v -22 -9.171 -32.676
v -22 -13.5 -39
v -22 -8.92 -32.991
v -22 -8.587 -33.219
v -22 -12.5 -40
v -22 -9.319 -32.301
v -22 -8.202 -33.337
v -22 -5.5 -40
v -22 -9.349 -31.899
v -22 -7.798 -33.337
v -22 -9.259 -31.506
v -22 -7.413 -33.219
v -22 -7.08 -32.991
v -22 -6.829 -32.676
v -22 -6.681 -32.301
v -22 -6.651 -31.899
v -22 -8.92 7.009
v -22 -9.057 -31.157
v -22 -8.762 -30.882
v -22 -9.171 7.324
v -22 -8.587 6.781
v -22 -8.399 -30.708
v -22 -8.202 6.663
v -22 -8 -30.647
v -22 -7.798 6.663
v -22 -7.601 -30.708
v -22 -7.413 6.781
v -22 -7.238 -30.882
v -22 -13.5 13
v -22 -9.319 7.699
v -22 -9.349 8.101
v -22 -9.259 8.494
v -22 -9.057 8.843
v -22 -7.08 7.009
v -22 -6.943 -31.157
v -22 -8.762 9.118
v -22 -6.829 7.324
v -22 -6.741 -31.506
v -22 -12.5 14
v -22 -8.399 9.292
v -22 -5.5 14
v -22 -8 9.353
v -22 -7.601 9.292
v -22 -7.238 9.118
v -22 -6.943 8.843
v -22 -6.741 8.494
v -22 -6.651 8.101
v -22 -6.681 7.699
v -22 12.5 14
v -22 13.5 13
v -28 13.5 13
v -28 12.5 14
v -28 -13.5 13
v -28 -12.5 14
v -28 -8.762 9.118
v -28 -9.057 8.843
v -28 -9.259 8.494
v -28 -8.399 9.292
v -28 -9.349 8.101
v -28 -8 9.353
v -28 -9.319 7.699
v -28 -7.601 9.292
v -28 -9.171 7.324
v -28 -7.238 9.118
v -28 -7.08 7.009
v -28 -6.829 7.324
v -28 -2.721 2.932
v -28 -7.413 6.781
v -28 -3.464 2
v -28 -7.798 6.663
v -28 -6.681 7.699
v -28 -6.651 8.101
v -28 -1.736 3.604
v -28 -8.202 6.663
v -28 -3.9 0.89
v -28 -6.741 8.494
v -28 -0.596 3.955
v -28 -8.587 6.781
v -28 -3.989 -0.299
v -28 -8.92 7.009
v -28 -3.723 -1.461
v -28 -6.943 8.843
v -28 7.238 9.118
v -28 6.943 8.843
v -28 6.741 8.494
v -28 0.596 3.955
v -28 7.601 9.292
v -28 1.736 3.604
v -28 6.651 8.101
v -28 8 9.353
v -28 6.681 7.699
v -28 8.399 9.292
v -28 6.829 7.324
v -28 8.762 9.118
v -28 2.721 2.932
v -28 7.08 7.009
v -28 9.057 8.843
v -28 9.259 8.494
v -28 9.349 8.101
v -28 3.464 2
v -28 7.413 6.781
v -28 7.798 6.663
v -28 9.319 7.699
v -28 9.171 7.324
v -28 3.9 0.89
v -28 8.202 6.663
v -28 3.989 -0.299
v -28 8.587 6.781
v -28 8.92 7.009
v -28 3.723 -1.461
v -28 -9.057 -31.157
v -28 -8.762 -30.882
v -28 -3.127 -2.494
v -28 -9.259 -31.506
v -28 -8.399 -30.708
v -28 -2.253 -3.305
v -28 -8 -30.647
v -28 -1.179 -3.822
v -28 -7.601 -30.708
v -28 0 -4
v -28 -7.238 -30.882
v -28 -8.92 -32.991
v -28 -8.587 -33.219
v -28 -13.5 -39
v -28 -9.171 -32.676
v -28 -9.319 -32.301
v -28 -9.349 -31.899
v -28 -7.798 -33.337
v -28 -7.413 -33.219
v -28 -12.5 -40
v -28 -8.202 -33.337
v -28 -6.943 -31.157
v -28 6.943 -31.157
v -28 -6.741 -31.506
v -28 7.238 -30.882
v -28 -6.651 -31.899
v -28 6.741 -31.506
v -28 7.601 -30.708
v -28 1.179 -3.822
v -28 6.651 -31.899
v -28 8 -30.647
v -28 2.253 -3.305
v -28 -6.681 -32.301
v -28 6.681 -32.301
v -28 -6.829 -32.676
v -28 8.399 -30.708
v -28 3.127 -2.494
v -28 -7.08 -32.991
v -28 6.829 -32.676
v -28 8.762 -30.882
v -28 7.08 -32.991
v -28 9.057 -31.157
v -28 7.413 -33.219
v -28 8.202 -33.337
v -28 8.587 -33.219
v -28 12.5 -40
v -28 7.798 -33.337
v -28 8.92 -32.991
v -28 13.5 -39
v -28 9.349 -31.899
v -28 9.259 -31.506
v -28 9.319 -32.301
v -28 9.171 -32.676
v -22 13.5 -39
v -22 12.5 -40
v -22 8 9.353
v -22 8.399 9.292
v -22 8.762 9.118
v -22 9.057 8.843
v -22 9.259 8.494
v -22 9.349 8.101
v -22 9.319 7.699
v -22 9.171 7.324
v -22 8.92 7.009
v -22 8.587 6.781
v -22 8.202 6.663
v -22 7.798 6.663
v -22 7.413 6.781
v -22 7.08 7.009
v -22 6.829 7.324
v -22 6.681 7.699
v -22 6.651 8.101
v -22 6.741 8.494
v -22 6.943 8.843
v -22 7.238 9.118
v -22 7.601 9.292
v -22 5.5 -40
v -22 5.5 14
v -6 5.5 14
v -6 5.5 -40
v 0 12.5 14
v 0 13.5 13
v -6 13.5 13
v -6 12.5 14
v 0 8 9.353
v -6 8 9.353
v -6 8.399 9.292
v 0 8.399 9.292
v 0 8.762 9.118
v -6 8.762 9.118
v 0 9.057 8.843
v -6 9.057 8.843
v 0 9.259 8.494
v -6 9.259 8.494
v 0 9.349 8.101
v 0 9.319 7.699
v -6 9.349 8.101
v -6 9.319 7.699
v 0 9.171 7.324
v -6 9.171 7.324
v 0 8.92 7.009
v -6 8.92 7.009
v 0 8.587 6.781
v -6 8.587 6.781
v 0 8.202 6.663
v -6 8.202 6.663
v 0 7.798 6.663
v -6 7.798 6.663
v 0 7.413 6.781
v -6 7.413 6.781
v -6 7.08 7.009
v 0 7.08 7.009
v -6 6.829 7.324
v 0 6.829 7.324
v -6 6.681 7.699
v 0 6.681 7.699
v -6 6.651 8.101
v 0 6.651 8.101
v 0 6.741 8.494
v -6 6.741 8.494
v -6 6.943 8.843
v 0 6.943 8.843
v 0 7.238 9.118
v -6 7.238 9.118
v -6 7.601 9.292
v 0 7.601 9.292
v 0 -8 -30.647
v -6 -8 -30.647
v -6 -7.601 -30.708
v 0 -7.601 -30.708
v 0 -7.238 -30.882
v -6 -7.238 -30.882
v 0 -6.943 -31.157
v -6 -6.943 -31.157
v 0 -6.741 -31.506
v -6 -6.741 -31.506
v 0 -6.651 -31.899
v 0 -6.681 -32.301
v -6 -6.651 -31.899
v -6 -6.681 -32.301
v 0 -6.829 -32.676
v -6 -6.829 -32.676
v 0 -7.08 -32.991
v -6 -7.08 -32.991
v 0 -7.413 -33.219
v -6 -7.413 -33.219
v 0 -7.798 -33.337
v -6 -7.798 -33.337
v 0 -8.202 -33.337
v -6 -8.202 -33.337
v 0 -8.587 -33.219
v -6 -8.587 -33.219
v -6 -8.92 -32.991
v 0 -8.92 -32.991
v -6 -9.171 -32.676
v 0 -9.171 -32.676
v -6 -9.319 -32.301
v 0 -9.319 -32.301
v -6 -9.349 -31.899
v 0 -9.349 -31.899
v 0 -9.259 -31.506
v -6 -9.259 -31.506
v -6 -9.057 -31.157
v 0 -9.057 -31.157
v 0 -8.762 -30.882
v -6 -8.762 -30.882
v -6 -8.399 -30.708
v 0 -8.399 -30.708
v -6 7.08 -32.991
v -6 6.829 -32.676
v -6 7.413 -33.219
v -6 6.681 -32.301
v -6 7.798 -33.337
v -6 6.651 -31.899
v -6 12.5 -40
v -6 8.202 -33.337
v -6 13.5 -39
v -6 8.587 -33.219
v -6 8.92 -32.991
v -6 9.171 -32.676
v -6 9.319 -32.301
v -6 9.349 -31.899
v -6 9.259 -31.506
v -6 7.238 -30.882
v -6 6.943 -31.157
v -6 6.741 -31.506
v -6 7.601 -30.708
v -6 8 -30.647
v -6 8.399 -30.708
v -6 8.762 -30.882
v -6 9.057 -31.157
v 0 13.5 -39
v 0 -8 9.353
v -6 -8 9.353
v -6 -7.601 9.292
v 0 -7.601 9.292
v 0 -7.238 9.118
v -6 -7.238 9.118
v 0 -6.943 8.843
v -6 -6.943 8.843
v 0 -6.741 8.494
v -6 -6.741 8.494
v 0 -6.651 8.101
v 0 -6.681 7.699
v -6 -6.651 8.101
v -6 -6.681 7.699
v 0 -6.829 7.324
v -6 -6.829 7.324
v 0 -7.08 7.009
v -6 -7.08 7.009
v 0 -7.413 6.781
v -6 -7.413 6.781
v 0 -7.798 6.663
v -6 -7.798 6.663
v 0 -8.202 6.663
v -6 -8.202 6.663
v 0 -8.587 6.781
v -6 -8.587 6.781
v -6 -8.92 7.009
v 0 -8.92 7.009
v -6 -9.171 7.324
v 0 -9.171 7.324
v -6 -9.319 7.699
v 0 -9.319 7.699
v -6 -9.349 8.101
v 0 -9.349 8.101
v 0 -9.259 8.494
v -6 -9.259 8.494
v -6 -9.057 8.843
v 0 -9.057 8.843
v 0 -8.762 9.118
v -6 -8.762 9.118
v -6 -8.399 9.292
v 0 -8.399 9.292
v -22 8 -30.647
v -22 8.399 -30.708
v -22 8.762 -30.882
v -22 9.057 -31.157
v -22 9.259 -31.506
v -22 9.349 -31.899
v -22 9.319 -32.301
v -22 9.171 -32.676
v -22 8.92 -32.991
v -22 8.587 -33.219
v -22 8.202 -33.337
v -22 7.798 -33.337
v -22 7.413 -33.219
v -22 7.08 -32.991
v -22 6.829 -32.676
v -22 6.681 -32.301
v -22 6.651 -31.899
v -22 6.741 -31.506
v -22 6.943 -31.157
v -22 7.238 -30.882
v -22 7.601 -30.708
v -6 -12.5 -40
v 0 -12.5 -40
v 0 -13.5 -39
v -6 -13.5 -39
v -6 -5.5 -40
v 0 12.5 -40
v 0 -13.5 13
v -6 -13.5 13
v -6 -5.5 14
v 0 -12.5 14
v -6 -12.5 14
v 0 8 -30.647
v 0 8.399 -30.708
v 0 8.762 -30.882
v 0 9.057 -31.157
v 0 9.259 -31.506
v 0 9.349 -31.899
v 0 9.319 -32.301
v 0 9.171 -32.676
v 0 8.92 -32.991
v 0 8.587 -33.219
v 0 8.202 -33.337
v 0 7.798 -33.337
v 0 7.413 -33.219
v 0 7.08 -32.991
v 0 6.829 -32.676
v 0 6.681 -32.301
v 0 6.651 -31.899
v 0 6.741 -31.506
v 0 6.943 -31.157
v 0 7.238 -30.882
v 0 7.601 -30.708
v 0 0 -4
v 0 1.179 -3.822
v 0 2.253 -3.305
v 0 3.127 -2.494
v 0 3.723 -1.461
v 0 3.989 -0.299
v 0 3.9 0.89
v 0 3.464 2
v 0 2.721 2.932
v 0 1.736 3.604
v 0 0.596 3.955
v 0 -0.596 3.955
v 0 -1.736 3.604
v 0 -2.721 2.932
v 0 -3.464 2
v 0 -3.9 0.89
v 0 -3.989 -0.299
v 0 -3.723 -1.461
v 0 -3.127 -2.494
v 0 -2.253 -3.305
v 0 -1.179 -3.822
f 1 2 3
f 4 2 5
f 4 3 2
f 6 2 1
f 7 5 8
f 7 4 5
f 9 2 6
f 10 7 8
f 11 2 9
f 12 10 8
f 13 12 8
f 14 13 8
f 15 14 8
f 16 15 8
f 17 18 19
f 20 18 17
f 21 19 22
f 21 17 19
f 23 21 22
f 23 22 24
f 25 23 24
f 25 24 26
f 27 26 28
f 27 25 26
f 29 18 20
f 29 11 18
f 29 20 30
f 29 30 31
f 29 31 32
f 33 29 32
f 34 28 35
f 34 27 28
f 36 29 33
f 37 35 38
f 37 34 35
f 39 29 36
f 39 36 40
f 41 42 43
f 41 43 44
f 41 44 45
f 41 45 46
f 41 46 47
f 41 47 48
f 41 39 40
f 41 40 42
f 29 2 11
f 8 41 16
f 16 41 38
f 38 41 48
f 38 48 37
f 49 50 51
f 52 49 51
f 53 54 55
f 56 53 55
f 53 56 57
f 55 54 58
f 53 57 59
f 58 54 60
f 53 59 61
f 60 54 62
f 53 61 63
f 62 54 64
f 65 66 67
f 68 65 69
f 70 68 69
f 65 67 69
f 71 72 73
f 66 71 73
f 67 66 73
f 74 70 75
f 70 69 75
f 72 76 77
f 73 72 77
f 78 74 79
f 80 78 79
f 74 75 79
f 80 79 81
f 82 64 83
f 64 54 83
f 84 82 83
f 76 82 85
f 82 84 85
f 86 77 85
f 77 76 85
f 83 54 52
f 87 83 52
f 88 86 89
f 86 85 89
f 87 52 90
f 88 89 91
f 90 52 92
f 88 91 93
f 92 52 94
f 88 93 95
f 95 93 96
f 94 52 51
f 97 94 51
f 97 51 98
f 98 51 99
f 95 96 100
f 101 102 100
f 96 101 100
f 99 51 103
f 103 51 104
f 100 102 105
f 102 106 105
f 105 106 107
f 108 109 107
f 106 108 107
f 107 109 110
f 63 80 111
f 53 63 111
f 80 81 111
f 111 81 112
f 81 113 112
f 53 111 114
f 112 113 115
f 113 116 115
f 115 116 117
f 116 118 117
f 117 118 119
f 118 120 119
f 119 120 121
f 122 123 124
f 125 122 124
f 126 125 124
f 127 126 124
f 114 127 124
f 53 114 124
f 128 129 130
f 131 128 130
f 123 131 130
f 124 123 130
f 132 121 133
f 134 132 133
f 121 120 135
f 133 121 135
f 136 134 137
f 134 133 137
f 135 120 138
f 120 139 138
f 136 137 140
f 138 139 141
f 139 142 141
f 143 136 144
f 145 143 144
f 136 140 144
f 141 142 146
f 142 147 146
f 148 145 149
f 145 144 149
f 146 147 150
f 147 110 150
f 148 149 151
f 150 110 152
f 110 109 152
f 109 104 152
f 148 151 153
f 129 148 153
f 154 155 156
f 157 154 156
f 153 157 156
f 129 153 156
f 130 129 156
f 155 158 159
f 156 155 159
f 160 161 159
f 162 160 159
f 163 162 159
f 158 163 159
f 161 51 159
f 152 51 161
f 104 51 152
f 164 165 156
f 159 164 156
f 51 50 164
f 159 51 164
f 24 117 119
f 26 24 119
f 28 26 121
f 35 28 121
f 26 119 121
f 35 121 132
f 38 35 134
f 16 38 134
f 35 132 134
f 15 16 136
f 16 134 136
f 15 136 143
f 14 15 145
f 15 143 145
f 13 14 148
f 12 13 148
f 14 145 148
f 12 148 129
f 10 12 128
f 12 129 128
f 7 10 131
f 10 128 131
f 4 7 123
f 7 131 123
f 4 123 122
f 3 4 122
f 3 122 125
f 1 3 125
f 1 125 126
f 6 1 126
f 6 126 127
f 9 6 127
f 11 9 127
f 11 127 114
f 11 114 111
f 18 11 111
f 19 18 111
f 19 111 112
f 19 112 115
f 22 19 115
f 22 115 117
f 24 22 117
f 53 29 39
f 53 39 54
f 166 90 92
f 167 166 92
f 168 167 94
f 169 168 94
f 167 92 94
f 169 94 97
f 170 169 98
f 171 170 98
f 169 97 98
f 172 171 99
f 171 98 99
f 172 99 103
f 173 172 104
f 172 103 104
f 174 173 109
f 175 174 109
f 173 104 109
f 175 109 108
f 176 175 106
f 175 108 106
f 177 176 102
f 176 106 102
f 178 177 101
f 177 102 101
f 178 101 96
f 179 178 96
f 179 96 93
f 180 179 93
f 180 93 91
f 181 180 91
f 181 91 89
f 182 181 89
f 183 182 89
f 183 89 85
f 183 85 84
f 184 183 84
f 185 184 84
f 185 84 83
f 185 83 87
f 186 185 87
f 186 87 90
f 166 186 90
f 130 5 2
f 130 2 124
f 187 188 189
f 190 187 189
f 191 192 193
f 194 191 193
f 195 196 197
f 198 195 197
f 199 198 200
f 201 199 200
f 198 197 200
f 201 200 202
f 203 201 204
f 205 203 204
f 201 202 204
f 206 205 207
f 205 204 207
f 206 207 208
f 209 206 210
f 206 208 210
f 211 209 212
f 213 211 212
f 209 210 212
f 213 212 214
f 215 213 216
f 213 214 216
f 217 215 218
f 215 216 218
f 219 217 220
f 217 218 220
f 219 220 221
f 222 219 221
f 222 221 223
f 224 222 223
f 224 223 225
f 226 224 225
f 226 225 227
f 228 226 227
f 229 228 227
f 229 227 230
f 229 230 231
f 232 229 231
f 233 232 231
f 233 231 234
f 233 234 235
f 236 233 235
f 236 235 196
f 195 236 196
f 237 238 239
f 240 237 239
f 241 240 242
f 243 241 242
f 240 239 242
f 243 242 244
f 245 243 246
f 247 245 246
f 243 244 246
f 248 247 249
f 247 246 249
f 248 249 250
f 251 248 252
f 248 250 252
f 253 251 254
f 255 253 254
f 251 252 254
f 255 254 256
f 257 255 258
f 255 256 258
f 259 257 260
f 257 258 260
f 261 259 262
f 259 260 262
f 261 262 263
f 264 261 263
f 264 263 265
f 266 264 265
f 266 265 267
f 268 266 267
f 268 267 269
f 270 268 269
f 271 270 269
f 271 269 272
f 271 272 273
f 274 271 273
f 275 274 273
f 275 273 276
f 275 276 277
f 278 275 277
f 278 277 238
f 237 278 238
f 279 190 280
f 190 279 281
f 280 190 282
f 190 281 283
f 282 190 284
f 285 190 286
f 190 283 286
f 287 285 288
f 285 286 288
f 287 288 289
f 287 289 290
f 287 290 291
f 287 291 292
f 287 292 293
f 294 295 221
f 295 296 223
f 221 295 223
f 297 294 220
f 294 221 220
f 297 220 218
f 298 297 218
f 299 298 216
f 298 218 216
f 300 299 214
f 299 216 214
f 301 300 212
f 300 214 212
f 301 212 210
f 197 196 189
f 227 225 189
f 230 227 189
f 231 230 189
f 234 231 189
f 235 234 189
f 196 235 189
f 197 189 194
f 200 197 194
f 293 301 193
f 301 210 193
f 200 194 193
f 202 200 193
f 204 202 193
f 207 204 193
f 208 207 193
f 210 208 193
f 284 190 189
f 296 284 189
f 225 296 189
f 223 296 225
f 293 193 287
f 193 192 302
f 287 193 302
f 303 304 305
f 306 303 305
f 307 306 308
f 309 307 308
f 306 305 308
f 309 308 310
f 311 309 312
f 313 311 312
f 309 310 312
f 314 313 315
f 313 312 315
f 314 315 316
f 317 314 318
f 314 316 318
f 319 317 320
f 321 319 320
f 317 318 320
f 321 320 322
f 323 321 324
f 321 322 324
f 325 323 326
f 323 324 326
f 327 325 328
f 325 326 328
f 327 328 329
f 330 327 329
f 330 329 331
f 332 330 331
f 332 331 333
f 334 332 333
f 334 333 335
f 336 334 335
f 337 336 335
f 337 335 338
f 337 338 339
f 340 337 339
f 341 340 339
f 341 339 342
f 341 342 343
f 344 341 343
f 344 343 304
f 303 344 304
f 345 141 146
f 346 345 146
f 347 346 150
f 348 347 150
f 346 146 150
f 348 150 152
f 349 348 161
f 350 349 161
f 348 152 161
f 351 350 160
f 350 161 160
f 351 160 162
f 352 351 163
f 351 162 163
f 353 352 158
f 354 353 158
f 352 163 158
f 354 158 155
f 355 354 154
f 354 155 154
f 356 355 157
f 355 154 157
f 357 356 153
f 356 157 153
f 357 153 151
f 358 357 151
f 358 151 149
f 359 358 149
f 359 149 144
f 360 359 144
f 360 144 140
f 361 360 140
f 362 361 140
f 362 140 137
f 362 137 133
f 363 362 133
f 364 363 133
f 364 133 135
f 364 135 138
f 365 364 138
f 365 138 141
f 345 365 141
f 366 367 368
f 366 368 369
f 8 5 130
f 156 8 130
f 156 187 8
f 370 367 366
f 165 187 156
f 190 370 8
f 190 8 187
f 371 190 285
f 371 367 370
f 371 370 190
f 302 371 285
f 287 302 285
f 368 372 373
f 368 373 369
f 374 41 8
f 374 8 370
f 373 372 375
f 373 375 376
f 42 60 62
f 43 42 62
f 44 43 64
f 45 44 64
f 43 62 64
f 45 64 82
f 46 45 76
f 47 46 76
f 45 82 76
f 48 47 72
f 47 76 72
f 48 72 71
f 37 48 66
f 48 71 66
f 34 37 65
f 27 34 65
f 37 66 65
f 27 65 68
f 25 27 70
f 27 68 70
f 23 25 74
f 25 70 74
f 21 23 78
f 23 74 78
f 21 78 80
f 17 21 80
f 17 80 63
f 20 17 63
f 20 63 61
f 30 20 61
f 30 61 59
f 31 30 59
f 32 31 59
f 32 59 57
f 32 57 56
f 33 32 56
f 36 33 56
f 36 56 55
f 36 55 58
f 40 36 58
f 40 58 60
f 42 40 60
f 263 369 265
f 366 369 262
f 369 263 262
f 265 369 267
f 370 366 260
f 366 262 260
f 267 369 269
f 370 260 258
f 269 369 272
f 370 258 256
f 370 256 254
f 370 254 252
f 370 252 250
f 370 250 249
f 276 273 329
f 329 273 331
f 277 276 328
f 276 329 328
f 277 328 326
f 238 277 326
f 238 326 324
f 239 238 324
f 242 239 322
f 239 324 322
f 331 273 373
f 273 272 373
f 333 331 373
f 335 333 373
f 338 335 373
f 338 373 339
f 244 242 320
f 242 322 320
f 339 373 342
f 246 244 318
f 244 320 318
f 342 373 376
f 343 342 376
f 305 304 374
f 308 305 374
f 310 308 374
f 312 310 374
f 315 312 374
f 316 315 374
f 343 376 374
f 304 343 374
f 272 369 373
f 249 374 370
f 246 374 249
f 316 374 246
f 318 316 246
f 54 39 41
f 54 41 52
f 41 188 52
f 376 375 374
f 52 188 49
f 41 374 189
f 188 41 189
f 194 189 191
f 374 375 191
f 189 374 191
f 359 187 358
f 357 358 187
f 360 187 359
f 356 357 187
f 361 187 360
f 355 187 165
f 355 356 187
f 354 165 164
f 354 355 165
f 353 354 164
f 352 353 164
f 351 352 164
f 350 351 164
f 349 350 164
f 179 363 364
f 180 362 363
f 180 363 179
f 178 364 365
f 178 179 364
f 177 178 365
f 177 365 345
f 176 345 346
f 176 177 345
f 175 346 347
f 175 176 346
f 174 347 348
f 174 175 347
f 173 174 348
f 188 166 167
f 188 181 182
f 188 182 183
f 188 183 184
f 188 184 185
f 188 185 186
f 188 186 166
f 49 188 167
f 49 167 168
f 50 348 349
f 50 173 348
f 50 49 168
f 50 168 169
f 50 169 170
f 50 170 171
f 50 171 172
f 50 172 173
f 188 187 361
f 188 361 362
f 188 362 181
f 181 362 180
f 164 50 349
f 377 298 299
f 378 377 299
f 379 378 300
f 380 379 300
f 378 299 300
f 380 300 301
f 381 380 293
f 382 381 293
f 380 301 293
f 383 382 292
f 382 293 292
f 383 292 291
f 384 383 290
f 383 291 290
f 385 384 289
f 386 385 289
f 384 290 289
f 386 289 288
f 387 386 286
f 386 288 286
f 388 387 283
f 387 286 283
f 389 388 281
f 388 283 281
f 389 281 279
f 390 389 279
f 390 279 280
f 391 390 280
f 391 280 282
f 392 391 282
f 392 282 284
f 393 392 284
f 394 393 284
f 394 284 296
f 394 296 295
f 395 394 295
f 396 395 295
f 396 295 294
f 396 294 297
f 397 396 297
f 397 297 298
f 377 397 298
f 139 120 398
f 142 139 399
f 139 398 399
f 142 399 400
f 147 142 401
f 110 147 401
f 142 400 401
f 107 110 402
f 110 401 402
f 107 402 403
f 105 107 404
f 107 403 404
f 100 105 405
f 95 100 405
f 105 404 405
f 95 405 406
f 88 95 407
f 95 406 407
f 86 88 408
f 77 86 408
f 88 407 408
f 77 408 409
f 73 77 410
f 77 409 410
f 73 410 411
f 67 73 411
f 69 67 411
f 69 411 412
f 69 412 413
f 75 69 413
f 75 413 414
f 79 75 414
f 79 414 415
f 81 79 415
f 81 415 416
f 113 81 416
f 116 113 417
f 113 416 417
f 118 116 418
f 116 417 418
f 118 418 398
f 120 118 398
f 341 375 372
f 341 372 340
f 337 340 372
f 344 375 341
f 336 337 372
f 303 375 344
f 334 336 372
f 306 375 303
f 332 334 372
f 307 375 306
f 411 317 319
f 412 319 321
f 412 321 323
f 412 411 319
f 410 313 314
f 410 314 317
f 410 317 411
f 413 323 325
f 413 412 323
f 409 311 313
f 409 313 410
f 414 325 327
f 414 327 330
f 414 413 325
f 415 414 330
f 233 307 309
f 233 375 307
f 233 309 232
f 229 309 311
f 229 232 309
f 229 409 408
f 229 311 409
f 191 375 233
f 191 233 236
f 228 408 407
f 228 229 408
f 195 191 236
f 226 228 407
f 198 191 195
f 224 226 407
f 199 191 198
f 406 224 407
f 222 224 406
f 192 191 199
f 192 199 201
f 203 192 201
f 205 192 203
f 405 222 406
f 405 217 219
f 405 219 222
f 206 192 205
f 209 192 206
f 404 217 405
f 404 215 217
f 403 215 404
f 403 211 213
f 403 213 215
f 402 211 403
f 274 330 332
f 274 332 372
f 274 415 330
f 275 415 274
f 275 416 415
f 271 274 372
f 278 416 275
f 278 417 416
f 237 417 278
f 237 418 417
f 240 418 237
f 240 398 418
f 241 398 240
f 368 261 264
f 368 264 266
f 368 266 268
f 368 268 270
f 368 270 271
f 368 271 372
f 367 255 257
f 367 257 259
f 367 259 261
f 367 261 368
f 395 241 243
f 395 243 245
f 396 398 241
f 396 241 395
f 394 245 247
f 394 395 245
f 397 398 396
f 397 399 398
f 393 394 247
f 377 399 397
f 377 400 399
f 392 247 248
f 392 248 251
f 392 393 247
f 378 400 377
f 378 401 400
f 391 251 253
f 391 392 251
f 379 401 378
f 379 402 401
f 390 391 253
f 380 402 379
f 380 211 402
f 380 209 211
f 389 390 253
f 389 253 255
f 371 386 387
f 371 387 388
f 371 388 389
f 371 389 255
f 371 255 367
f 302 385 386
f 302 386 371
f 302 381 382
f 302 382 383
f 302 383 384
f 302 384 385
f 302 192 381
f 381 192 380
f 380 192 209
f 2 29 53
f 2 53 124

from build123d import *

# Parameters (mm, degrees)
SKETCH1_W             = 54
SKETCH1_H             = 27
SKETCH1_R             = 4
BOSS_EXTRUDE1_DEPTH   = 28
F_6_32_TAPPED_HOLE1_D = 2.7051
SKETCH4_W             = 16
SKETCH4_H             = 8
CUT_EXTRUDE1_DEPTH    = 55
CHAMFER1_SIZE         = 1


with BuildPart() as part:
    # Sketch1 → Boss-Extrude1 (new body)
    with BuildSketch(Plane(origin=(0, 0, 0), x_dir=(0, 0, -1), z_dir=(1, 0, 0))):
        with Locations((13, 0)):
            Rectangle(SKETCH1_W, SKETCH1_H)
        Circle(SKETCH1_R, mode=Mode.SUBTRACT)
    extrude(amount=-BOSS_EXTRUDE1_DEPTH)

    # #6-32 Tapped Hole1 (through all)
    with Locations(Plane(origin=(0, 0, 0), x_dir=(0, 0, -1), z_dir=(1, 0, 0))):
        with Locations((-8, 8), (-8, -8), (32, -8), (32, 8)):
            Hole(F_6_32_TAPPED_HOLE1_D / 2)

    # Sketch4 → Cut-Extrude1 (cut, through all)
    with BuildSketch(Plane.XY.offset(14)):
        with Locations((-14, 9.5)):
            Rectangle(SKETCH4_W, SKETCH4_H)
        with Locations((-14, -9.5)):
            Rectangle(SKETCH4_W, SKETCH4_H)
    extrude(amount=-CUT_EXTRUDE1_DEPTH, mode=Mode.SUBTRACT)

    # Chamfer1
    chamfer1_edges = [part.edges().sort_by_distance(p)[0] for p in [
        (-3, 13.5, -40),
        (-3, 13.5, 14),
        (-3, -13.5, 14),
        (-3, -13.5, -40),
        (-25, 13.5, 14),
        (-25, 13.5, -40),
        (-25, -13.5, -40),
        (-25, -13.5, 14),
    ]]
    chamfer(chamfer1_edges, length=CHAMFER1_SIZE)


solid = part.part
